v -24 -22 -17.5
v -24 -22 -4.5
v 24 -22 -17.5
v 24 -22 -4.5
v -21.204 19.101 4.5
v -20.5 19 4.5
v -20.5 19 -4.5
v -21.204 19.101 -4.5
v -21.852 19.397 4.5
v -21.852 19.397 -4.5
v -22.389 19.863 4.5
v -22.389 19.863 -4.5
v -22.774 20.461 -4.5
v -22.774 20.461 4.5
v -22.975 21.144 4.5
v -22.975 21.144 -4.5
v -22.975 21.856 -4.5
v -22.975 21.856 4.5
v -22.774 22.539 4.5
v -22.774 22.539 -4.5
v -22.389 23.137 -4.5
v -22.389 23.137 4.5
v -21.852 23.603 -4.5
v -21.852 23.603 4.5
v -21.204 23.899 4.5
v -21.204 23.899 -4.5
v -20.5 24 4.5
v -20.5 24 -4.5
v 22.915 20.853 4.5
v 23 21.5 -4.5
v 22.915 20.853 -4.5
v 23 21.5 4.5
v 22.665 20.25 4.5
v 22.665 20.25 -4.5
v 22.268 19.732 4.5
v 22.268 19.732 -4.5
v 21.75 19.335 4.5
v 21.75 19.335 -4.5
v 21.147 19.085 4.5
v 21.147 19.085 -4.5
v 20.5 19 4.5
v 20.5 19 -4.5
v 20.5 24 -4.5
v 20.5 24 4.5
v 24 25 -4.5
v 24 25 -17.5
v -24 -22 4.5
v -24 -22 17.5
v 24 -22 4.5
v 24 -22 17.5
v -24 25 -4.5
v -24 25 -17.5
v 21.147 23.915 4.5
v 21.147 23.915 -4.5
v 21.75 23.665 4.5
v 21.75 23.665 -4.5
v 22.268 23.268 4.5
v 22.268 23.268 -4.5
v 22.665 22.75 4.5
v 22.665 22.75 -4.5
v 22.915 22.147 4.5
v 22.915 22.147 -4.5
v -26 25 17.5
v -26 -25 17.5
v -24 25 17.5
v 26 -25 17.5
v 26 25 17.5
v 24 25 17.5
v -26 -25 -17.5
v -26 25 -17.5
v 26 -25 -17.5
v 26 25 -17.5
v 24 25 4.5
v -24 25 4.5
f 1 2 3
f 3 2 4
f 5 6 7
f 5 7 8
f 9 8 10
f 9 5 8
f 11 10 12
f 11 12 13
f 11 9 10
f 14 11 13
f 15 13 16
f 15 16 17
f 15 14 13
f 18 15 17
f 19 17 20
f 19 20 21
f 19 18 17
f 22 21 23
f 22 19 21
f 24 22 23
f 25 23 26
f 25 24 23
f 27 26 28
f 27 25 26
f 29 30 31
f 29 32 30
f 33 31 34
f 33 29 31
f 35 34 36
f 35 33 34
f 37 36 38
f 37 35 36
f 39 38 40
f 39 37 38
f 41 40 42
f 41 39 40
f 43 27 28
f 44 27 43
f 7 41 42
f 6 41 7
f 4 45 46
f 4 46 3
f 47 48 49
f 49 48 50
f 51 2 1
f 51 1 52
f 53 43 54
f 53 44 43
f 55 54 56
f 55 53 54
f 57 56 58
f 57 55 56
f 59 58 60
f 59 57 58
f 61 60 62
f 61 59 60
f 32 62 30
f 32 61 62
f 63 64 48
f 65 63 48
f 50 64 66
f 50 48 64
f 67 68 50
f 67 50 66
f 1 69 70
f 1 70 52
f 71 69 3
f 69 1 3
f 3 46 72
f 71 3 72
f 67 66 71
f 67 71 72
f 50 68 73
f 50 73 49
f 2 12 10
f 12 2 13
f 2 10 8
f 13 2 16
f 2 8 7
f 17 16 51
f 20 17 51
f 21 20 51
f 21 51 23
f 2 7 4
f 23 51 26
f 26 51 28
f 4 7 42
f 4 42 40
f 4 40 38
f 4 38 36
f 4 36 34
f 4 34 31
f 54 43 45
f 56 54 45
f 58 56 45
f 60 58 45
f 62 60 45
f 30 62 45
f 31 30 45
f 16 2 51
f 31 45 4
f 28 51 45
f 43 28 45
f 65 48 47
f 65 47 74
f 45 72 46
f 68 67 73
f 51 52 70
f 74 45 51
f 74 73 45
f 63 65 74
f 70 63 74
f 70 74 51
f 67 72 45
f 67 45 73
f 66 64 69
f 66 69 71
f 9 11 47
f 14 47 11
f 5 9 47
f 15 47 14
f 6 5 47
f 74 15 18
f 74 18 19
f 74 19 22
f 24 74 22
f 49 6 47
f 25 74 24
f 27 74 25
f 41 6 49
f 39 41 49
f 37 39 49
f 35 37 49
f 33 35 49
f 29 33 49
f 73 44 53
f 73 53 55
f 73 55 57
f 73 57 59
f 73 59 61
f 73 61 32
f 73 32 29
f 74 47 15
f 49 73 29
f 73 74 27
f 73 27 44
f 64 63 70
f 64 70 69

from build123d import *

# Parameters (mm, degrees)
F0_W     = 48
F0_H     = 47
F1_DEPTH = 4.5
F0_H_2   = 3
F2_DEPTH = 17.5


with BuildPart() as f1:
    # F0 (on Top) → F1 (new body, symmetric)
    with BuildSketch(Plane.XY):
        with Locations((0, 1.5)):
            Rectangle(F0_W, F0_H)
        with BuildLine():
            ThreePointArc((-20.5, 19), (-23, 21.5), (-20.5, 24))
            Line((-20.5, 24), (20.5, 24))
            ThreePointArc((20.5, 24), (22.267767, 23.267767), (23, 21.5))
            ThreePointArc((23, 21.5), (22.267767, 19.732233), (20.5, 19))
            Line((20.5, 19), (-20.5, 19))
        make_face(mode=Mode.SUBTRACT)
    extrude(amount=F1_DEPTH, both=True)

    # F0 (on Top) → F2 (join, symmetric)
    with BuildSketch(Plane.XY):
        Polygon((-24, 25), (-26, 25), (-26, -25), (-24, -25), (-24, -22), align=None)
        with Locations((0, -23.5)):
            Rectangle(F0_W, F0_H_2)
        Polygon((26, 25), (24, 25), (24, -22), (24, -25), (26, -25), align=None)
    extrude(amount=F2_DEPTH, both=True)


solid = f1.part
